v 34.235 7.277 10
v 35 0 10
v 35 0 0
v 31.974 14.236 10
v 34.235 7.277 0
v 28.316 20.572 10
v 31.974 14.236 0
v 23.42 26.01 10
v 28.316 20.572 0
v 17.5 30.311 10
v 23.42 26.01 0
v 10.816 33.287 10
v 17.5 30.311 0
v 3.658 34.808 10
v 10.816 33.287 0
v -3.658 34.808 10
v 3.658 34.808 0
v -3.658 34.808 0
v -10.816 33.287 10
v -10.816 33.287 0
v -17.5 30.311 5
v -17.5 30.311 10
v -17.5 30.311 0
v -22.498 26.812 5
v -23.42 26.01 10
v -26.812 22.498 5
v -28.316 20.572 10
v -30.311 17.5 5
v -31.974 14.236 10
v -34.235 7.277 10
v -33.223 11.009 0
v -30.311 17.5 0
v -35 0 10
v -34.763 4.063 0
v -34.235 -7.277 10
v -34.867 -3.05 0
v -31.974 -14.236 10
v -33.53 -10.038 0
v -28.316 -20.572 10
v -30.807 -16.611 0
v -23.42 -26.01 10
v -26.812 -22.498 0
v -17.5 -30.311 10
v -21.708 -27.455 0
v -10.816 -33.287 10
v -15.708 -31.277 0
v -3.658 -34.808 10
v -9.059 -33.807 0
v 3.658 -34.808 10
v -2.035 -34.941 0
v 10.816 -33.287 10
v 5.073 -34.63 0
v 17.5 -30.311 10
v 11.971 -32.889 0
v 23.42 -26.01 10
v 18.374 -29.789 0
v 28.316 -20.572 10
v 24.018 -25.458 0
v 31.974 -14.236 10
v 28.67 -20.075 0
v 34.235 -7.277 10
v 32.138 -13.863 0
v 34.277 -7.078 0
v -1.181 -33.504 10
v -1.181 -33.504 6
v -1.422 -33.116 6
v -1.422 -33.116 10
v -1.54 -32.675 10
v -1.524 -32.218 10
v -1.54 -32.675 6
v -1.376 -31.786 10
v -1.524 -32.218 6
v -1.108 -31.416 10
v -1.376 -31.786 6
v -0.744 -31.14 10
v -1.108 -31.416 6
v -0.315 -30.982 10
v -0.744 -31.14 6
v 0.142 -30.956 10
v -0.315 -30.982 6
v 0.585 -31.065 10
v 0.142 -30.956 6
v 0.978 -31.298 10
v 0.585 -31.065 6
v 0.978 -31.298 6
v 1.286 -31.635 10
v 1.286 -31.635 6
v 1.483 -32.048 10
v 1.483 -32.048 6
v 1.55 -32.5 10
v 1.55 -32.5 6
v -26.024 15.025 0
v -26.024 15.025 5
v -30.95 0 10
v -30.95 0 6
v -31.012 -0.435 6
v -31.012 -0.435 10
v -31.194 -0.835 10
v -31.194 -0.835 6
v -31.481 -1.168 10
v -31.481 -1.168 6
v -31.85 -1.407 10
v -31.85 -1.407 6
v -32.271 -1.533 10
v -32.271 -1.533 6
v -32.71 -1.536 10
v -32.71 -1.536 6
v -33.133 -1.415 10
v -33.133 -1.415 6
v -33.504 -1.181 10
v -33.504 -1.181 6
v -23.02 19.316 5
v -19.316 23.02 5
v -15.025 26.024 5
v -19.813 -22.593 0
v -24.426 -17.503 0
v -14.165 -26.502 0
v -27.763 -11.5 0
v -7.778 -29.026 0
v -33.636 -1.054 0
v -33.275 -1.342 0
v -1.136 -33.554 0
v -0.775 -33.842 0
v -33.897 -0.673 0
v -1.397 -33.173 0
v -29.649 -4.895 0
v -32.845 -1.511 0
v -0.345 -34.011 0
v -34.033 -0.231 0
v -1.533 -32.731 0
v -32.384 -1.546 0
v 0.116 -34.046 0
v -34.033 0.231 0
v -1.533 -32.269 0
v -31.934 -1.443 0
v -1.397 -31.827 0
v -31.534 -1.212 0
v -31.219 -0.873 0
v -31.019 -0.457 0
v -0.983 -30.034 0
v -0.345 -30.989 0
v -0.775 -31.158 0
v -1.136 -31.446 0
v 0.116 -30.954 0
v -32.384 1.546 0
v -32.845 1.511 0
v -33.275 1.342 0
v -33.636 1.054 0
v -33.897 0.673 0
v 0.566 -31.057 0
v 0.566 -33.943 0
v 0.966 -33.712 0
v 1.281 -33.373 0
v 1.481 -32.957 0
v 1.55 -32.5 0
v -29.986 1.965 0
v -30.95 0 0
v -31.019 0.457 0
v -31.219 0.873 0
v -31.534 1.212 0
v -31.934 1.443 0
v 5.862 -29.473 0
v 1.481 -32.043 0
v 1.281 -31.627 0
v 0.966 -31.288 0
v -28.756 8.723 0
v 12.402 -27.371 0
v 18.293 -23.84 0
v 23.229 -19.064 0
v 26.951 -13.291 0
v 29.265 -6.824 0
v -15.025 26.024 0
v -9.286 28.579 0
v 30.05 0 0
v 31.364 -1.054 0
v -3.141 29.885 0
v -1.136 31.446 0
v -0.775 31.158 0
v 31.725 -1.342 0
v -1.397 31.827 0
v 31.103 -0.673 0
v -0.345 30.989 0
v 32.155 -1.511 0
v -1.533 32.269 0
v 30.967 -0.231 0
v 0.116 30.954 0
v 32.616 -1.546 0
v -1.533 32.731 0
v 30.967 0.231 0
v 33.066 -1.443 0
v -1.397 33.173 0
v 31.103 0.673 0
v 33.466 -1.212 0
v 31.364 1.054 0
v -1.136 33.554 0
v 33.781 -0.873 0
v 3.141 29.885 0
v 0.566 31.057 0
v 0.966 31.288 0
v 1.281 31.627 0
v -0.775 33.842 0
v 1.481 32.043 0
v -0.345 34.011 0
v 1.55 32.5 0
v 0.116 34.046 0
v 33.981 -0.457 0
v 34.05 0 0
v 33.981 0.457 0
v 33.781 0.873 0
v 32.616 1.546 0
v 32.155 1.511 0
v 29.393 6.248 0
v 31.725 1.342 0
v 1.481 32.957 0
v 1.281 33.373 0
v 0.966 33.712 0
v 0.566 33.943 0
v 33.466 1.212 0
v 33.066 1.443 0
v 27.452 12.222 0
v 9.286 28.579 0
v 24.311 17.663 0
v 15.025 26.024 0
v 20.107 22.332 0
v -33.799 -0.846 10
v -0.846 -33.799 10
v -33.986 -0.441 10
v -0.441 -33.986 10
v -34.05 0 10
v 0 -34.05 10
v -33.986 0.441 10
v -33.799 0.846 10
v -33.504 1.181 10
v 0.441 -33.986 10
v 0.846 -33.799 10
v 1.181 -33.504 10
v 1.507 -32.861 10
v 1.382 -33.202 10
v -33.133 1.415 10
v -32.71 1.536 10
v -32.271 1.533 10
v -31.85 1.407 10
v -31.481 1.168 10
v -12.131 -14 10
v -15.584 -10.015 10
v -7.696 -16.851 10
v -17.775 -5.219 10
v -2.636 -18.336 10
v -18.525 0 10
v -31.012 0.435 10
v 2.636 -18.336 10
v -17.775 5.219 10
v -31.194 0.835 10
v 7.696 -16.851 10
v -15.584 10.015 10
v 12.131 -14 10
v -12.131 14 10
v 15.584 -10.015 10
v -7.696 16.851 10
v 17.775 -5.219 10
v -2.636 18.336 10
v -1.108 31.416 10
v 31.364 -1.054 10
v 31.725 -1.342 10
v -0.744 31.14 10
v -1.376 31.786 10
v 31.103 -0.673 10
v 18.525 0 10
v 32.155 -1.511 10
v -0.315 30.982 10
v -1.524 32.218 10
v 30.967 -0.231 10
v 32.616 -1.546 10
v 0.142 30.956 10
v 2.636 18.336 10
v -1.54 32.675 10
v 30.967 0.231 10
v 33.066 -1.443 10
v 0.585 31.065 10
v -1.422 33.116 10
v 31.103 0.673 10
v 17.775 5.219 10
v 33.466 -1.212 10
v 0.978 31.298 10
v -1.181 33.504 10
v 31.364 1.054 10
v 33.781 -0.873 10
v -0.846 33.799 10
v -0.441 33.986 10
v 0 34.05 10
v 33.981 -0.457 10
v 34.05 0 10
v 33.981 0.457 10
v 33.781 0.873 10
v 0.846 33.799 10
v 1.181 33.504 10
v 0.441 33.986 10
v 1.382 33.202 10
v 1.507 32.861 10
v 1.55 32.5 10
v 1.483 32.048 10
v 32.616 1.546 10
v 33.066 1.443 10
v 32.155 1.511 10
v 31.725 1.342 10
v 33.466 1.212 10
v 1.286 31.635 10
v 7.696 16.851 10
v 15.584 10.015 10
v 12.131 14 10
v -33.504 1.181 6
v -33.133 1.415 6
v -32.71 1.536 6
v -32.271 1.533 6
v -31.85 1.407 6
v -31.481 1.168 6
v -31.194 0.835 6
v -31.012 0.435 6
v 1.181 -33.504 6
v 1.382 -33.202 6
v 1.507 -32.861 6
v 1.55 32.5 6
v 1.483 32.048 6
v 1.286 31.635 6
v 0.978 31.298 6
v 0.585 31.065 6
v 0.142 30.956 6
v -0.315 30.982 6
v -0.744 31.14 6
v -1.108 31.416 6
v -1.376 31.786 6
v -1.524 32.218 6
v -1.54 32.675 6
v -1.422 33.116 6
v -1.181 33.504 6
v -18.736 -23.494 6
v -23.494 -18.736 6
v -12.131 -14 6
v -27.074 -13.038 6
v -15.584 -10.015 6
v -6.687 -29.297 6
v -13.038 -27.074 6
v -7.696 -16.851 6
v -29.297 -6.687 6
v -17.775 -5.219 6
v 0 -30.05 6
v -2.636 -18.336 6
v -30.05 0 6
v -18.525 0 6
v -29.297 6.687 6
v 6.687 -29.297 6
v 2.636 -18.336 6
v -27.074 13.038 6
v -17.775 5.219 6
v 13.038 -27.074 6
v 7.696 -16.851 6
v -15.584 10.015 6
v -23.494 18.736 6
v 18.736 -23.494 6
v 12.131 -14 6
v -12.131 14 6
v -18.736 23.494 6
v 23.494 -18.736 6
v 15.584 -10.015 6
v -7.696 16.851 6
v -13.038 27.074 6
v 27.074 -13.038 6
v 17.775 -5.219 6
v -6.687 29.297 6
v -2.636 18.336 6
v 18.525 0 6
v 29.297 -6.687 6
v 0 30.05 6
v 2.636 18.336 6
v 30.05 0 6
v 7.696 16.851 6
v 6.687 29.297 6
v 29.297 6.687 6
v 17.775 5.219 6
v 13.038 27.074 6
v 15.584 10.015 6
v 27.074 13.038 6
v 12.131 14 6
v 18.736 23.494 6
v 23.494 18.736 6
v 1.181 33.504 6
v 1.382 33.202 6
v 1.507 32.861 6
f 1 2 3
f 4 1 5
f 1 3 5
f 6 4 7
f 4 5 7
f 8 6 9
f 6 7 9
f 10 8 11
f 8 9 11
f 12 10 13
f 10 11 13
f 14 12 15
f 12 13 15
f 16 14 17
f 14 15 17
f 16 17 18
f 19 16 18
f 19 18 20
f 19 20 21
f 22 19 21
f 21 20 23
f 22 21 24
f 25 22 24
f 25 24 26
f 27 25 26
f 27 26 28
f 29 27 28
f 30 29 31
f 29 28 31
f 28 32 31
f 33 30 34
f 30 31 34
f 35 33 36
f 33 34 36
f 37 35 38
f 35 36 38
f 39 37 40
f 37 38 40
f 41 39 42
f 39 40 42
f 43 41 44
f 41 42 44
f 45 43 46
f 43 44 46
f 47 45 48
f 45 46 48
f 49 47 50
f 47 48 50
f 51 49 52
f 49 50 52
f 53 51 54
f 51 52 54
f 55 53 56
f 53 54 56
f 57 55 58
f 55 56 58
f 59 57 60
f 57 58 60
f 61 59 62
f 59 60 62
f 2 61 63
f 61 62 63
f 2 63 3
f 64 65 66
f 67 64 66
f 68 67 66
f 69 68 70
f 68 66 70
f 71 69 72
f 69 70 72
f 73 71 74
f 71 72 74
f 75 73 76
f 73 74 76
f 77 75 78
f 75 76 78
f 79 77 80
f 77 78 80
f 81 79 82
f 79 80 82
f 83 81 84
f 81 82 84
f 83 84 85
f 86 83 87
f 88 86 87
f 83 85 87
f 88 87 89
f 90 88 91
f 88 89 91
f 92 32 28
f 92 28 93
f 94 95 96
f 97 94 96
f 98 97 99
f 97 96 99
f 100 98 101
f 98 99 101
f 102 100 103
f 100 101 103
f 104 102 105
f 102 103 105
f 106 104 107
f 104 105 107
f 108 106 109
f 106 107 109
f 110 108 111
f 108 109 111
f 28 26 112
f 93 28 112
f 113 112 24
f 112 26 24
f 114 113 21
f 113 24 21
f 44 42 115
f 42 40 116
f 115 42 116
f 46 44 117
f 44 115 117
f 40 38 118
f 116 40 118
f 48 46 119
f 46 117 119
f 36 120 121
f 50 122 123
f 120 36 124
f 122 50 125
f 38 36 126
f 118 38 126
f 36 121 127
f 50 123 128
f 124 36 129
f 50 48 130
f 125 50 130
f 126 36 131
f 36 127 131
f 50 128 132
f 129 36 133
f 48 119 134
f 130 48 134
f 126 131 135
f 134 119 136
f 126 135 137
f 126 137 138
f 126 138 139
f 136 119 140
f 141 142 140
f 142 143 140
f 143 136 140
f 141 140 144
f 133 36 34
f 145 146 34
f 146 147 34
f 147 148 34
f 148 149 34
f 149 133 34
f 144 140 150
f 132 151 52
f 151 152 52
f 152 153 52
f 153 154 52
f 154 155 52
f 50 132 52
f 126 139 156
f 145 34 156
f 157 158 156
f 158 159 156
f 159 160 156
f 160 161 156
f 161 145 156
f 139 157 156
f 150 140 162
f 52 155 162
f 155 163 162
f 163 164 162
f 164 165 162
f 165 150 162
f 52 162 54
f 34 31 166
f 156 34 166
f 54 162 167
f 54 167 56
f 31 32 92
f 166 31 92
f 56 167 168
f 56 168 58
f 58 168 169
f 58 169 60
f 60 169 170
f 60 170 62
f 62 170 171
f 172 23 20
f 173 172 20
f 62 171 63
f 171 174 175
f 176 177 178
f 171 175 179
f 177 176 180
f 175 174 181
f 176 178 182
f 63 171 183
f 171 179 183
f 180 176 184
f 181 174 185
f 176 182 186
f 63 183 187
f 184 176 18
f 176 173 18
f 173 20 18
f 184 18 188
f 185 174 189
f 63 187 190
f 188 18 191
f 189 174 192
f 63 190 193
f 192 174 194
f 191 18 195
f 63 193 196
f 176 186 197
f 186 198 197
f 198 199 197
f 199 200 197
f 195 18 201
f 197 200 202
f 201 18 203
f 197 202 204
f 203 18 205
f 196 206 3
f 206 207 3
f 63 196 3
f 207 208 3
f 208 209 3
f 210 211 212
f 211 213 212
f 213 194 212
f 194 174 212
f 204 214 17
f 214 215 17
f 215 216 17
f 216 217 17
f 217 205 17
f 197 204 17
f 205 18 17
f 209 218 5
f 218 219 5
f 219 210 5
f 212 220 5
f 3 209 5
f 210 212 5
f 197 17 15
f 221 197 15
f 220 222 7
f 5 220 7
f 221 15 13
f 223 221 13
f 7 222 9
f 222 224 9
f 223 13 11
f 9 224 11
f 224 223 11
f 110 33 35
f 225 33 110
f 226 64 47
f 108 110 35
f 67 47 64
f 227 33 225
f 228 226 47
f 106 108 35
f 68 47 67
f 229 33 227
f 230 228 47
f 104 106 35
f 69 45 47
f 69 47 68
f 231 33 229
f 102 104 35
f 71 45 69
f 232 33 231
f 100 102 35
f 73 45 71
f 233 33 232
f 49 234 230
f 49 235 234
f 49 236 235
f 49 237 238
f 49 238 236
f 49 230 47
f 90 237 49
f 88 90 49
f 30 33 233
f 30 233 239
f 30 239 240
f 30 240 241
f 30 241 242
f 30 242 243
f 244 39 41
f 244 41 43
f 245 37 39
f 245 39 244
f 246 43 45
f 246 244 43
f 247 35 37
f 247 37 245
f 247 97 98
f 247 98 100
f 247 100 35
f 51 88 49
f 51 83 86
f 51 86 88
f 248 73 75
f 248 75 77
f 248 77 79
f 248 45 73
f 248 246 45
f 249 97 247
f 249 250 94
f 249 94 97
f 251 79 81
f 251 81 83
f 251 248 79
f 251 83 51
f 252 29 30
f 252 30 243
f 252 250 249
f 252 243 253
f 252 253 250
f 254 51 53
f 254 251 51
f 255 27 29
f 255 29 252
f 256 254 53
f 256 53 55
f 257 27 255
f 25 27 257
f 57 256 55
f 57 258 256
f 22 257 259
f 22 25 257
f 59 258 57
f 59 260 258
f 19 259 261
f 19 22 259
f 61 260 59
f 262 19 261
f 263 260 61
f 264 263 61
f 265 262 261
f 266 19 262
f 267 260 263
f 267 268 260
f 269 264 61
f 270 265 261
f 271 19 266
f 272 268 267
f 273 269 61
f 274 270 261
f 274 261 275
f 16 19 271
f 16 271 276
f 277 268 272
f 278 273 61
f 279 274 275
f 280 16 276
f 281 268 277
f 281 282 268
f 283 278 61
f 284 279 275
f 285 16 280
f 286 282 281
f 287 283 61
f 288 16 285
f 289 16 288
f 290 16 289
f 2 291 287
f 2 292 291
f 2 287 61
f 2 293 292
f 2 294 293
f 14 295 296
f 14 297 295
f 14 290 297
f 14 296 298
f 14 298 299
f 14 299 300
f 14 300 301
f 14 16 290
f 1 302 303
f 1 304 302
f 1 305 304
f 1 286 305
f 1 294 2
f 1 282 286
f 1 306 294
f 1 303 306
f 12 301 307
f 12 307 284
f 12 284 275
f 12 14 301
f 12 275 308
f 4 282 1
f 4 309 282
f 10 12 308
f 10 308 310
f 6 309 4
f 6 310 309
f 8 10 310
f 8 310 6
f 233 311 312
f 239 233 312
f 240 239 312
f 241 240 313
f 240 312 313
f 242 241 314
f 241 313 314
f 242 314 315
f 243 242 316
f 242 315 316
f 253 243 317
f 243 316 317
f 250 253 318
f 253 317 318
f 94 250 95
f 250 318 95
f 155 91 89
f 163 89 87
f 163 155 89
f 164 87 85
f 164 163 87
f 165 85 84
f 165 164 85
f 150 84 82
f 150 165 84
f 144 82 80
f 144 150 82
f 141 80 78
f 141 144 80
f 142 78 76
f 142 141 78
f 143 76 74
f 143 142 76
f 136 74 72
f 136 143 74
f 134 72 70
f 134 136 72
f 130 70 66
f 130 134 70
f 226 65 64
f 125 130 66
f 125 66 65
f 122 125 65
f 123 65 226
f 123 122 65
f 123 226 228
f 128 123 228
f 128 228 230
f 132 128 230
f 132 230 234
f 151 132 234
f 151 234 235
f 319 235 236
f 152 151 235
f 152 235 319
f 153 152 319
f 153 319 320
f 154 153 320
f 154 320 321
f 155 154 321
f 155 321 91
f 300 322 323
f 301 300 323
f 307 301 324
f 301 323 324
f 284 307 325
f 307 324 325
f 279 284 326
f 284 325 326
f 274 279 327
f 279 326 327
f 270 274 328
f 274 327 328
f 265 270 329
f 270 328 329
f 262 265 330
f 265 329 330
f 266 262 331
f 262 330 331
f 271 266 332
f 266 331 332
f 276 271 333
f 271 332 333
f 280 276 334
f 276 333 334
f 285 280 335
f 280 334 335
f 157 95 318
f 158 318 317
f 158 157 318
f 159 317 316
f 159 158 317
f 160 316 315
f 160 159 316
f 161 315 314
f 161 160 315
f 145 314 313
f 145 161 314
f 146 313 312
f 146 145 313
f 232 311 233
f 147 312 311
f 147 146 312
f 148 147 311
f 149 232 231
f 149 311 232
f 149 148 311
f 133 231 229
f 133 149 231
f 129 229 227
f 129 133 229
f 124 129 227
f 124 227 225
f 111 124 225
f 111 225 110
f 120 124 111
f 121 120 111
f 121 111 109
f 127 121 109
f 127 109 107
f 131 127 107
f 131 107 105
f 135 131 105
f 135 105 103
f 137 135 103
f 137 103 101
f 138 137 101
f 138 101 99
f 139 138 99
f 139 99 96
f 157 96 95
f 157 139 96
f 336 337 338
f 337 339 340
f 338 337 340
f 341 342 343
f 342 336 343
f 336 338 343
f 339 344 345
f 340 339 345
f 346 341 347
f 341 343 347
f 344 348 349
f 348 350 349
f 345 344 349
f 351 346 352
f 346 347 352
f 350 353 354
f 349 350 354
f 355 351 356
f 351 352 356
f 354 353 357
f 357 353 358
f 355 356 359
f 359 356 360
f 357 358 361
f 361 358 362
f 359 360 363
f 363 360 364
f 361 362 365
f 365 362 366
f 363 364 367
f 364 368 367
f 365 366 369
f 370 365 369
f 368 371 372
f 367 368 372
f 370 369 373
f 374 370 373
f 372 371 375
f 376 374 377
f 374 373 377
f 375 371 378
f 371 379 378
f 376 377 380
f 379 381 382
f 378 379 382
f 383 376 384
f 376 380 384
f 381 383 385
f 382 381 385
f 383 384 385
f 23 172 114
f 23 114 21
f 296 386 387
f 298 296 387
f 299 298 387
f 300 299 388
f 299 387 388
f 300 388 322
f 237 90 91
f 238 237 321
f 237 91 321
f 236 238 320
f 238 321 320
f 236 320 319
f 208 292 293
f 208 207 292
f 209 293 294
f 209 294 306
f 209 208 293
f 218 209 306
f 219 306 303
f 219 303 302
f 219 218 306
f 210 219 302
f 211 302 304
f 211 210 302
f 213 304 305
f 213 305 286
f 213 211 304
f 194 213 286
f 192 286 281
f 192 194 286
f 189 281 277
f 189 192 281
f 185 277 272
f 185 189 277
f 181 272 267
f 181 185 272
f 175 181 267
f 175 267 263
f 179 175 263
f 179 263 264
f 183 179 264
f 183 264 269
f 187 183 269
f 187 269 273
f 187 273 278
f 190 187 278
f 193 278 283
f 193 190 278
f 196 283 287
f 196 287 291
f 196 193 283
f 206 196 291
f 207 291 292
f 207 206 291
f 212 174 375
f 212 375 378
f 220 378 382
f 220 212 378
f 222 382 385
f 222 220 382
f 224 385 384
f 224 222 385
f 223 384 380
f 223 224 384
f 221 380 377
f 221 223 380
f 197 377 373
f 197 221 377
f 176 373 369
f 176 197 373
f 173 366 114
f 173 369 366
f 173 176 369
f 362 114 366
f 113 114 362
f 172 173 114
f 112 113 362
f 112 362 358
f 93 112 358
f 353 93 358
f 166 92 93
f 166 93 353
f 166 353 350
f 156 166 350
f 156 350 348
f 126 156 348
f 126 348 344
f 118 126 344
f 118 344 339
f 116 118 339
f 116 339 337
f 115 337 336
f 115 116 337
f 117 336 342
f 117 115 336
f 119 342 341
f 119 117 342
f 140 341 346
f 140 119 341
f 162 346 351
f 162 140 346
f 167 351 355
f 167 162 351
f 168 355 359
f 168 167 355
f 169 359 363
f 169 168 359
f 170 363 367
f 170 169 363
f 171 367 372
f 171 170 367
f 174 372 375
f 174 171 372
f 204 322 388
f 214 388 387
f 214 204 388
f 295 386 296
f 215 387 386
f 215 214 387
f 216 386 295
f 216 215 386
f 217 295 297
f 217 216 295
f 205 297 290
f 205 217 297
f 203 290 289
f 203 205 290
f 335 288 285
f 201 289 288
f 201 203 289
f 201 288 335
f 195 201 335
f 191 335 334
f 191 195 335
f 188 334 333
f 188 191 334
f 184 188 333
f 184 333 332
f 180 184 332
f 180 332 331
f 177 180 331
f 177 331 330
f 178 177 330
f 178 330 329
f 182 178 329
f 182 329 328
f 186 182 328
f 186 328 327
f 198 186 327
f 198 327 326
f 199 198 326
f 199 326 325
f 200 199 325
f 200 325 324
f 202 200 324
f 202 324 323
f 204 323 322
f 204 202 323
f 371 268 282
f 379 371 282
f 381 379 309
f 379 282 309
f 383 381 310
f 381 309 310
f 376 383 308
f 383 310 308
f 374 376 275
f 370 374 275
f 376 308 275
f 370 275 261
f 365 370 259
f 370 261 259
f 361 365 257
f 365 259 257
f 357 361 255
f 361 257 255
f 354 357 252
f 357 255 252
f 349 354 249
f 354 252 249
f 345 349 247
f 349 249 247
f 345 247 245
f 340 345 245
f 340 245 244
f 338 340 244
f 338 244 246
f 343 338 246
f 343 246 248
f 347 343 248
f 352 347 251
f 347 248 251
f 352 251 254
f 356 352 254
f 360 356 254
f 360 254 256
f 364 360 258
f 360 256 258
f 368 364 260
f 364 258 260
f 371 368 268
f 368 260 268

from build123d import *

# Parameters (mm, degrees)
EXTRUDE_1_OUTLINE_R   = 35
EXTRUDE_1_OUTLINE_R_2 = 1.55
EXTRUDE_1_OUTLINE_R_3 = 30.05
EXTRUDE_1_DEPTH       = 10
SKETCH_2_R            = 33.525
SKETCH_2_R_2          = 18.525
EXTRUDE_1_2_DEPTH     = 4
SKETCH_3_R            = 1.55
CUT_EXTRUDE_1_DEPTH   = 51.497524692
CUT_EXTRUDE_2_DEPTH   = 5


# Read off the part's stored shape, not the designer's step: 凸台-拉伸1
with BuildPart() as part:
    # Extrude 1 outline → Extrude 1 (new body)
    with BuildSketch(Plane.XY):
        Circle(EXTRUDE_1_OUTLINE_R)
        with Locations((0, -32.5)):
            Circle(EXTRUDE_1_OUTLINE_R_2, mode=Mode.SUBTRACT)
        with Locations((-32.5, 0)):
            Circle(EXTRUDE_1_OUTLINE_R_2, mode=Mode.SUBTRACT)
        Circle(EXTRUDE_1_OUTLINE_R_3, mode=Mode.SUBTRACT)
        with Locations((32.5, 0)):
            Circle(EXTRUDE_1_OUTLINE_R_2, mode=Mode.SUBTRACT)
        with Locations((0, 32.5)):
            Circle(EXTRUDE_1_OUTLINE_R_2, mode=Mode.SUBTRACT)
    extrude(amount=EXTRUDE_1_DEPTH)

    # 草图2 → Extrude 1 2 (add)
    with BuildSketch(Plane.XY.offset(10)):
        Circle(SKETCH_2_R)
        Circle(SKETCH_2_R_2, mode=Mode.SUBTRACT)
    extrude(amount=-EXTRUDE_1_2_DEPTH)

    # 草图3 → 切除-拉伸1 (cut, through all)
    with BuildSketch(Plane(origin=(0, 0, 0), x_dir=(-1, 0, 0), z_dir=(0, 0, -1))):
        with Locations(Location((32.5, 0, 0), (0, 0, 180))):
            Circle(SKETCH_3_R)
        with Locations(Location((0, -32.5, 0), (0, 0, 180))):
            Circle(SKETCH_3_R)
        with Locations(Location((-32.5, 0, 0), (0, 0, 180))):
            Circle(SKETCH_3_R)
        with Locations(Location((0, 32.5, 0), (0, 0, 180))):
            Circle(SKETCH_3_R)
    extrude(amount=-CUT_EXTRUDE_1_DEPTH, mode=Mode.SUBTRACT)

    # 草图7 → 切除-拉伸2 (cut)
    with BuildSketch(Plane(origin=(0, 0, 0), x_dir=(-1, 0, 0), z_dir=(0, 0, -1))):
        with BuildLine():
            Line((15.025, 26.024063384), (17.5, 30.310889132))
            ThreePointArc((17.5, 30.310889132), (24.748737342, 24.748737342), (30.310889132, 17.5))
            Line((30.310889132, 17.5), (26.024063384, 15.025))
            ThreePointArc((26.024063384, 15.025), (21.248558775, 21.248558775), (15.025, 26.024063384))
        make_face()
    extrude(amount=-CUT_EXTRUDE_2_DEPTH, mode=Mode.SUBTRACT)


solid = part.part
